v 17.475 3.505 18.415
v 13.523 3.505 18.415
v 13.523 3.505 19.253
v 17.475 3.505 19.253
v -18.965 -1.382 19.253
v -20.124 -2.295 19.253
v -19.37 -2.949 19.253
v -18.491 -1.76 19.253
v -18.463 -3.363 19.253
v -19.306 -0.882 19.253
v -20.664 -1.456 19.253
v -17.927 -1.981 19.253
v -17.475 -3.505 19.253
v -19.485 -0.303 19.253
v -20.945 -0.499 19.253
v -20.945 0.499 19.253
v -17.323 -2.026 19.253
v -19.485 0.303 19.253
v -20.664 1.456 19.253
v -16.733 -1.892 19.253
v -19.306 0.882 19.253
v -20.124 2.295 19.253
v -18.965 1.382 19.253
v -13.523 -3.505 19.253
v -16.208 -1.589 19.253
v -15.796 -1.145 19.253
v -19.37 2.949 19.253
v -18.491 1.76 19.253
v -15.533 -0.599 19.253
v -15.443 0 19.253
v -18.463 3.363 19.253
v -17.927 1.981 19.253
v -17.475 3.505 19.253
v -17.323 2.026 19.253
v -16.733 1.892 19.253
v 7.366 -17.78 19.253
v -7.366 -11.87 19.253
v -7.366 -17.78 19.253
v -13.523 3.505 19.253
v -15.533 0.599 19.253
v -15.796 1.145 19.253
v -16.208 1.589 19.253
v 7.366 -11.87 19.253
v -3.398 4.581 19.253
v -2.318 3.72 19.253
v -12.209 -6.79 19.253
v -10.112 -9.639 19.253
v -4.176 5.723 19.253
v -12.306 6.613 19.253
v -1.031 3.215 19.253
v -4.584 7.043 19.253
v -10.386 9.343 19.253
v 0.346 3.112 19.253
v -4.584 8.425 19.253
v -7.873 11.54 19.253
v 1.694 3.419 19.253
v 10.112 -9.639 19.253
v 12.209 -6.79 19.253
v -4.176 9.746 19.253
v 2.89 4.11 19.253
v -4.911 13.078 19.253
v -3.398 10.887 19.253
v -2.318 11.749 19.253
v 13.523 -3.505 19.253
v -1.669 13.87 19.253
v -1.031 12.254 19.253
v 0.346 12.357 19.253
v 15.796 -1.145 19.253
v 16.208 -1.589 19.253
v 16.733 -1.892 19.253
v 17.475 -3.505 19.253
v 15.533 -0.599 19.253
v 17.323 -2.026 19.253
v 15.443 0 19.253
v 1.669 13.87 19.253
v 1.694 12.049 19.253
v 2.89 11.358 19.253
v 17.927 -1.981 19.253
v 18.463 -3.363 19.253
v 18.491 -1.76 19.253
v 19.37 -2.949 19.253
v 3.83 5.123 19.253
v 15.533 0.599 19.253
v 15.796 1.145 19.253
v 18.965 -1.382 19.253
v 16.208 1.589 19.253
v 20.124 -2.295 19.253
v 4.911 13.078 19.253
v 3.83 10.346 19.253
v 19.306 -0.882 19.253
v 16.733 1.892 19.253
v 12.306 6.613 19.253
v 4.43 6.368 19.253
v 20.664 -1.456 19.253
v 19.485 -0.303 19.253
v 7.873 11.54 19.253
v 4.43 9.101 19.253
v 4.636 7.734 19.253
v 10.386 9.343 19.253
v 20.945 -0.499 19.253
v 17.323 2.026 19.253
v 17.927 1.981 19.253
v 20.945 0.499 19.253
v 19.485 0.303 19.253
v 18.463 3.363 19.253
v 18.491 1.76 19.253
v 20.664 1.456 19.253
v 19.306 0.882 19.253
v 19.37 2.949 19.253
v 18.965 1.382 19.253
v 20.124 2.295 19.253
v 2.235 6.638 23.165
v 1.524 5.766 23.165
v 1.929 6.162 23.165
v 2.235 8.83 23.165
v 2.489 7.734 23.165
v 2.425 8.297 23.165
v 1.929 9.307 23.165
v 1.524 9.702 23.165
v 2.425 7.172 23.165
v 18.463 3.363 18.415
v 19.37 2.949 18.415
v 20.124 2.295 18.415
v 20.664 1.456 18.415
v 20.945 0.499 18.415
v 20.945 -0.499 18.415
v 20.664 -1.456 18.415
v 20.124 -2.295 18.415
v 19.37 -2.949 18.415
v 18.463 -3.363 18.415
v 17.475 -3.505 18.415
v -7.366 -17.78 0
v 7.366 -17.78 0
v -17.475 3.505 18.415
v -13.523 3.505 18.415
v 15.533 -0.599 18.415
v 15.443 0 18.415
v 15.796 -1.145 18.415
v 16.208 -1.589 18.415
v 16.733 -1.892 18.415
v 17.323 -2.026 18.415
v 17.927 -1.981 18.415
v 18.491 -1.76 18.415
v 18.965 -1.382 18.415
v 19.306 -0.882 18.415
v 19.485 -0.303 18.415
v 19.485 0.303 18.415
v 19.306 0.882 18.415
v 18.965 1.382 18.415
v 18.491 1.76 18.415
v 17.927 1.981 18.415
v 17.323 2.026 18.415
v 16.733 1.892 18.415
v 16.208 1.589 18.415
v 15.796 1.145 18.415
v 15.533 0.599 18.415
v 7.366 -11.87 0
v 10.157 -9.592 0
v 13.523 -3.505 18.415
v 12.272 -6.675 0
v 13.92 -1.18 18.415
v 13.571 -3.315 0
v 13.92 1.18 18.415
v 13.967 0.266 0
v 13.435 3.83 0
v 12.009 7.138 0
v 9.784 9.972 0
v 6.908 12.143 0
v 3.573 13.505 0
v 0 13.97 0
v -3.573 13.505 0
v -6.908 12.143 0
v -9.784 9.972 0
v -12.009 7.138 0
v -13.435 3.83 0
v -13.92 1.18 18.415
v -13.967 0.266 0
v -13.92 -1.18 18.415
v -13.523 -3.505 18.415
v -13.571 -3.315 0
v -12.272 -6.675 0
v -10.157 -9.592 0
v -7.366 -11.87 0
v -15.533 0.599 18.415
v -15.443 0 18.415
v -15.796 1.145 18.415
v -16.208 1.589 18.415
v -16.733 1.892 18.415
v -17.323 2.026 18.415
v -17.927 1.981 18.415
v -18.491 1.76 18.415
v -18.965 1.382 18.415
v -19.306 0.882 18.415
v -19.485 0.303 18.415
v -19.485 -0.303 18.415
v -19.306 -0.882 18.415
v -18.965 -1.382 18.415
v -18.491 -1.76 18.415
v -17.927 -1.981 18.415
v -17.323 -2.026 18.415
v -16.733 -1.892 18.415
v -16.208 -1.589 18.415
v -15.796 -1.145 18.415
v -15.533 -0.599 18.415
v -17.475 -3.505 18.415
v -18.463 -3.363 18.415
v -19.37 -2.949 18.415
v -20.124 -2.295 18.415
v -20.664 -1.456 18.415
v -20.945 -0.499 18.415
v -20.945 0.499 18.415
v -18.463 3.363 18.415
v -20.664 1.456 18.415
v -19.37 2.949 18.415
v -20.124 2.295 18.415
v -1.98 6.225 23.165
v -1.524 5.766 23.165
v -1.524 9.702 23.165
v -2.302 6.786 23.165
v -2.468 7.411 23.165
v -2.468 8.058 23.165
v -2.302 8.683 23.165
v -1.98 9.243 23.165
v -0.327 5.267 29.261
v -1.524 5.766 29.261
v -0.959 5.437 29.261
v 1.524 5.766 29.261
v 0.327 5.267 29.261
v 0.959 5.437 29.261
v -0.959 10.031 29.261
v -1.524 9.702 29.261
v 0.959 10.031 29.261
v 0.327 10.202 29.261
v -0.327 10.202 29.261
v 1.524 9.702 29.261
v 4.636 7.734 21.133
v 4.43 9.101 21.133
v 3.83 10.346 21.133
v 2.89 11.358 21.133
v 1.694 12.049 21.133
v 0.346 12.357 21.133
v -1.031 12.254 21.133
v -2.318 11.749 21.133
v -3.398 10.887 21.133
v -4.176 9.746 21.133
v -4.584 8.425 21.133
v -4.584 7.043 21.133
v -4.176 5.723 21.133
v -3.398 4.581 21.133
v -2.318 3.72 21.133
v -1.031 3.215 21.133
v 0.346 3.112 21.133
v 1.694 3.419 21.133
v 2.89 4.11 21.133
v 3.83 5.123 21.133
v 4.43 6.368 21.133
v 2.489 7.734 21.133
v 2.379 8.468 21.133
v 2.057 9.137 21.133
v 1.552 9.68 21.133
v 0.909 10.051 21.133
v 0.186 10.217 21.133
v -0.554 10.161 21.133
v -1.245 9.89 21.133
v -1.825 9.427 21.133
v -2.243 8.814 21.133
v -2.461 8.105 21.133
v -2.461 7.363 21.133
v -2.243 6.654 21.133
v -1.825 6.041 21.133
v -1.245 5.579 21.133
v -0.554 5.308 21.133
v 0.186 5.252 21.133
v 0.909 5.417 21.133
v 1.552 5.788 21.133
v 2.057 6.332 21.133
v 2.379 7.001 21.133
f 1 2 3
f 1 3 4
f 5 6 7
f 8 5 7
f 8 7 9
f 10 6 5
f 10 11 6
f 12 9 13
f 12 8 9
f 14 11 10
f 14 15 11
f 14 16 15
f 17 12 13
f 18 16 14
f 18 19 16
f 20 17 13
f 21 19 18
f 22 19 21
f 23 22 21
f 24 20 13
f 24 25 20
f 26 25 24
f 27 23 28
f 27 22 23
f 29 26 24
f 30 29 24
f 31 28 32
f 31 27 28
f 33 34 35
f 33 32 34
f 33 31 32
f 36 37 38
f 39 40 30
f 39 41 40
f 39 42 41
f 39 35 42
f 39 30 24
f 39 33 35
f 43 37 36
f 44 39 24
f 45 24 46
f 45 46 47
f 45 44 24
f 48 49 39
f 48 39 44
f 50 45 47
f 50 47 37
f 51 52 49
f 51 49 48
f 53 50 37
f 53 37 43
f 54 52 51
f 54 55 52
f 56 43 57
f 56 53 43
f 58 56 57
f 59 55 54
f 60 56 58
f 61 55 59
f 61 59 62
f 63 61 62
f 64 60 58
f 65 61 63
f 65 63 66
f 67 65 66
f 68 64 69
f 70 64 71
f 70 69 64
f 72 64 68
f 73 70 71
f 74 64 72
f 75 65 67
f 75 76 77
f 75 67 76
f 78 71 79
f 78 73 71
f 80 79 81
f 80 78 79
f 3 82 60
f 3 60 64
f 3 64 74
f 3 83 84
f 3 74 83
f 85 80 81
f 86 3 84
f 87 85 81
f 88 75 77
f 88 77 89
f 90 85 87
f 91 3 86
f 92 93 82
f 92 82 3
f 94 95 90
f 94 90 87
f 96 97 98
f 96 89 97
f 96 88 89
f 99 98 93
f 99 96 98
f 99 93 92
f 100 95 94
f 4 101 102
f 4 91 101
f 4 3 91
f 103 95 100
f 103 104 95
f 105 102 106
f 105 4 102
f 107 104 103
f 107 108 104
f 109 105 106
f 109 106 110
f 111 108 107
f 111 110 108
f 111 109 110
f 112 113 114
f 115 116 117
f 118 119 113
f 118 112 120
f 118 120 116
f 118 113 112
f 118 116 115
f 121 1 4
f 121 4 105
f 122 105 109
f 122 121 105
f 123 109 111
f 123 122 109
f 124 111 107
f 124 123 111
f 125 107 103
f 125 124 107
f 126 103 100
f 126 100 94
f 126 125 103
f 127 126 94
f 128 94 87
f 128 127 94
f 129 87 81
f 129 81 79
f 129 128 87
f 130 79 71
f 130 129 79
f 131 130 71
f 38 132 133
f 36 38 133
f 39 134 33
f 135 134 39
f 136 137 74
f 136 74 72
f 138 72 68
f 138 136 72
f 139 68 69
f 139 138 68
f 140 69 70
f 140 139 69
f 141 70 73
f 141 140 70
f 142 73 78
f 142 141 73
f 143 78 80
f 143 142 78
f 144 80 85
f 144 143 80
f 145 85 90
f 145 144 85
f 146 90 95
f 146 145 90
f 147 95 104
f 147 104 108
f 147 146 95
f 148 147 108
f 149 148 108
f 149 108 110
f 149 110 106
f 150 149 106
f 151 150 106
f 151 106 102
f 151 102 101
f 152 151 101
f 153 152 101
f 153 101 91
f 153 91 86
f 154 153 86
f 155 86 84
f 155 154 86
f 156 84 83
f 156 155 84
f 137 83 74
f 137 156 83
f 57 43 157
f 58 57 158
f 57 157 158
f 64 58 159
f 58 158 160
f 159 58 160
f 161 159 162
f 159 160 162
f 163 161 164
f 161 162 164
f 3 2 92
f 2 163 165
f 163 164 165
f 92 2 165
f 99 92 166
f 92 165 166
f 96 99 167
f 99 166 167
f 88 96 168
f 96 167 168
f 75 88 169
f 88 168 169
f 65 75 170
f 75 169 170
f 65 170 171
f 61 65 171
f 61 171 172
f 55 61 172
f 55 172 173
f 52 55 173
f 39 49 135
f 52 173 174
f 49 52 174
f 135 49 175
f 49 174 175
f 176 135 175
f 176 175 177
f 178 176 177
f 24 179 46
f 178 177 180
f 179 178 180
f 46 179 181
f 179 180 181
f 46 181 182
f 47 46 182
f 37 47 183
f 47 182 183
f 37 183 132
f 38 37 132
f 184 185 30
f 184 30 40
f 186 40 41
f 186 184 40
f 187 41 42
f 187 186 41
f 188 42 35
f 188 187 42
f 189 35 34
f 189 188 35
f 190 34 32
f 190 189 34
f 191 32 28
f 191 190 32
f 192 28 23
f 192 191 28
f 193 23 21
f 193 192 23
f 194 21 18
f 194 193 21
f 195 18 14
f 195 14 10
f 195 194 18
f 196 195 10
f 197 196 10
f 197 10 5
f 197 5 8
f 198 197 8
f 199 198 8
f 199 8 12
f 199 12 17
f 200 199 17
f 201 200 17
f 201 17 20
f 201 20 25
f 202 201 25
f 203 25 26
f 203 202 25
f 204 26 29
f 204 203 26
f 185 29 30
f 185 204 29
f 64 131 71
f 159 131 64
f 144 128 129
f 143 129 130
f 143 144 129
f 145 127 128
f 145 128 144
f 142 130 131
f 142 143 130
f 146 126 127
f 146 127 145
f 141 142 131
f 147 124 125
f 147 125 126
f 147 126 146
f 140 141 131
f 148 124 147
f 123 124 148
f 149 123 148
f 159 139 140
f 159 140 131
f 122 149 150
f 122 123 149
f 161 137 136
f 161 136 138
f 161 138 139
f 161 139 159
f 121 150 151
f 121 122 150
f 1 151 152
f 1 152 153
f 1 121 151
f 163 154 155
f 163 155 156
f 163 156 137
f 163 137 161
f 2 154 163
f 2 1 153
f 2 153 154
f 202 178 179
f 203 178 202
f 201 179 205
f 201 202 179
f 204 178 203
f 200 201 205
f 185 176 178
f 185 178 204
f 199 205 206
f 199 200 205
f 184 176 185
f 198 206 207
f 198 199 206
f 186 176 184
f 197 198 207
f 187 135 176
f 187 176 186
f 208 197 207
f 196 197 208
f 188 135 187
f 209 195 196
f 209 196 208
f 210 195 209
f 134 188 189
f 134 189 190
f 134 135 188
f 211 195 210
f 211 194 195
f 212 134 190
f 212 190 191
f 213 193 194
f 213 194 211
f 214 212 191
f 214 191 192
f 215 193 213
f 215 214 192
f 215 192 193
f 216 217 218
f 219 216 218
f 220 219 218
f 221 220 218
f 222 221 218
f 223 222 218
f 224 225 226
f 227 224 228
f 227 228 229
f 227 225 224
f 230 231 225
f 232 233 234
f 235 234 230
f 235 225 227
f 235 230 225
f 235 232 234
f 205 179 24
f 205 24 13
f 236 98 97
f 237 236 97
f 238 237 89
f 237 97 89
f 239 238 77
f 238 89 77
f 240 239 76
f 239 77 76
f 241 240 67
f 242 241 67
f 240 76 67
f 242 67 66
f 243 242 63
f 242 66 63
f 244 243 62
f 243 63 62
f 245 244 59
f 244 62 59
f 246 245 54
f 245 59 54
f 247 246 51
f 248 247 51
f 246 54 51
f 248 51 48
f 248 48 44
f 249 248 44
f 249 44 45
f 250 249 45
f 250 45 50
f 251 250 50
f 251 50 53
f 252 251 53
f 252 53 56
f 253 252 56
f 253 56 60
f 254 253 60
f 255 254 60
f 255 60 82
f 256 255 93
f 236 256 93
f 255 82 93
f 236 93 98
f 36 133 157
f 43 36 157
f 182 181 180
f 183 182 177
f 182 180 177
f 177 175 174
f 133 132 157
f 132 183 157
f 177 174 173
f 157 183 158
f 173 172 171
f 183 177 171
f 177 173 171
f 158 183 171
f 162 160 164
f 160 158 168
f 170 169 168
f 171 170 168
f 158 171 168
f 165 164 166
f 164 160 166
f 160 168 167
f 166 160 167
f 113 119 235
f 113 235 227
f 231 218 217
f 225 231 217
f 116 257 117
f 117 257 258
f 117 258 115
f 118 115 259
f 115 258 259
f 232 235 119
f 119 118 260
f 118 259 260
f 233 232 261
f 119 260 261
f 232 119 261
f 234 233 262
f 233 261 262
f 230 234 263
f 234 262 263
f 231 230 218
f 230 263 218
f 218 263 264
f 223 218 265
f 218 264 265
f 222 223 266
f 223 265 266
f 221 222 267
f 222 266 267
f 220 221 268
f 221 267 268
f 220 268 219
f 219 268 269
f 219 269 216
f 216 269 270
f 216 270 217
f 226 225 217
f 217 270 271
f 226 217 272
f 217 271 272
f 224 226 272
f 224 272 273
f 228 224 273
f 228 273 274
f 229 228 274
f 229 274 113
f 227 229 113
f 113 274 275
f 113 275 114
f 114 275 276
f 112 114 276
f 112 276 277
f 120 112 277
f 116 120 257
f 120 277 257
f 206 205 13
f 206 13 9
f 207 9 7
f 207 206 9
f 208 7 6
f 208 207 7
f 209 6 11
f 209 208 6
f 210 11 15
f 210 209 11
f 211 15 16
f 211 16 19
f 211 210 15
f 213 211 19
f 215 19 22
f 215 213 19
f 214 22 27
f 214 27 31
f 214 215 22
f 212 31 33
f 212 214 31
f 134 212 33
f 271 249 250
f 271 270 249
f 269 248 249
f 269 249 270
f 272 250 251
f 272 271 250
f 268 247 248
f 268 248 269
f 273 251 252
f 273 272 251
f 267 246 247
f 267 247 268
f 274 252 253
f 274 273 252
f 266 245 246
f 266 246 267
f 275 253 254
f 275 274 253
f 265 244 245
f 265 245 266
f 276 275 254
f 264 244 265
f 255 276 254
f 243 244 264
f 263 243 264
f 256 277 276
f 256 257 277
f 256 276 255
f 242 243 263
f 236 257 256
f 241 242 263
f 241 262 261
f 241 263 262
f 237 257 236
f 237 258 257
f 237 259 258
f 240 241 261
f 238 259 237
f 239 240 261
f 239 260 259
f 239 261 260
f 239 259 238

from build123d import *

# Parameters (mm, degrees)
BOSS_EXTRUDE1_DEPTH = 19.2532
BOSS_EXTRUDE2_START = -0.8382
SKETCH2_R           = 2.032
BOSS_EXTRUDE2_DEPTH = 0.8382
SKETCH3_R           = 4.6355
BOSS_EXTRUDE3_DEPTH = 1.8796
SKETCH4_R           = 2.4892
BOSS_EXTRUDE4_DEPTH = 8.128
CUT_EXTRUDE1_START  = -6.096
CUT_EXTRUDE1_DEPTH  = 6.096


with BuildPart() as part:
    # Sketch1 → Boss-Extrude1 (new body)
    with BuildSketch(Plane.XY):
        with BuildLine():
            Line((-7.366, -17.78), (7.366, -17.78))
            Line((7.366, -17.78), (7.366, -11.870254589))
            ThreePointArc((7.366, -11.870254589), (0, 13.97), (-7.366, -11.870254589))
            Line((-7.366, -11.870254589), (-7.366, -17.78))
        make_face()
    extrude(amount=BOSS_EXTRUDE1_DEPTH)

    # Sketch2 → Boss-Extrude2 (add)
    # profile 1 of 2: a face of its own
    with BuildSketch(Plane.XY.offset(19.2532).offset(BOSS_EXTRUDE2_START)):
        with BuildLine():
            Line((-13.52310885, -3.5052), (-17.4752, -3.5052))
            ThreePointArc((-17.4752, -3.5052), (-20.9804, 0), (-17.4752, 3.5052))
            Line((-17.4752, 3.5052), (-13.52310885, 3.5052))
            ThreePointArc((-13.52310885, 3.5052), (-13.97, 0), (-13.52310885, -3.5052))
        make_face()
        with Locations((-17.4752, 0)):
            Circle(SKETCH2_R, mode=Mode.SUBTRACT)
    # profile 2 of 2: a face of its own
    with BuildSketch(Plane.XY.offset(19.2532).offset(BOSS_EXTRUDE2_START)):
        with BuildLine():
            Line((13.52310885, 3.5052), (17.4752, 3.5052))
            ThreePointArc((17.4752, 3.5052), (20.9804, 0), (17.4752, -3.5052))
            Line((17.4752, -3.5052), (13.52310885, -3.5052))
            ThreePointArc((13.52310885, -3.5052), (13.97, 0), (13.52310885, 3.5052))
        make_face()
        with Locations(Location((17.4752, 0, 0), (0, 0, 180))):
            Circle(SKETCH2_R, mode=Mode.SUBTRACT)
    extrude(amount=BOSS_EXTRUDE2_DEPTH)

    # Sketch3 → Boss-Extrude3 (add)
    with BuildSketch(Plane.XY.offset(19.2532)):
        with Locations((0, 7.7343)):
            Circle(SKETCH3_R)
    extrude(amount=BOSS_EXTRUDE3_DEPTH)

    # Sketch4 → Boss-Extrude4 (add)
    with BuildSketch(Plane.XY.offset(21.1328)):
        with Locations((0, 7.7343)):
            Circle(SKETCH4_R)
    extrude(amount=BOSS_EXTRUDE4_DEPTH)

    # Sketch5 → Cut-Extrude1 (cut)
    with BuildSketch(Plane.XY.offset(29.2608).offset(CUT_EXTRUDE1_START)):
        with BuildLine():
            Line((-1.524, 9.702431256), (-1.524, 5.766168744))
            ThreePointArc((-1.524, 5.766168744), (-2.4892, 7.7343), (-1.524, 9.702431256))
        make_face()
        with BuildLine():
            Line((1.524, 9.702431256), (1.524, 5.766168744))
            ThreePointArc((1.524, 5.766168744), (2.4892, 7.7343), (1.524, 9.702431256))
        make_face()
    extrude(amount=CUT_EXTRUDE1_DEPTH, mode=Mode.SUBTRACT)


solid = part.part
